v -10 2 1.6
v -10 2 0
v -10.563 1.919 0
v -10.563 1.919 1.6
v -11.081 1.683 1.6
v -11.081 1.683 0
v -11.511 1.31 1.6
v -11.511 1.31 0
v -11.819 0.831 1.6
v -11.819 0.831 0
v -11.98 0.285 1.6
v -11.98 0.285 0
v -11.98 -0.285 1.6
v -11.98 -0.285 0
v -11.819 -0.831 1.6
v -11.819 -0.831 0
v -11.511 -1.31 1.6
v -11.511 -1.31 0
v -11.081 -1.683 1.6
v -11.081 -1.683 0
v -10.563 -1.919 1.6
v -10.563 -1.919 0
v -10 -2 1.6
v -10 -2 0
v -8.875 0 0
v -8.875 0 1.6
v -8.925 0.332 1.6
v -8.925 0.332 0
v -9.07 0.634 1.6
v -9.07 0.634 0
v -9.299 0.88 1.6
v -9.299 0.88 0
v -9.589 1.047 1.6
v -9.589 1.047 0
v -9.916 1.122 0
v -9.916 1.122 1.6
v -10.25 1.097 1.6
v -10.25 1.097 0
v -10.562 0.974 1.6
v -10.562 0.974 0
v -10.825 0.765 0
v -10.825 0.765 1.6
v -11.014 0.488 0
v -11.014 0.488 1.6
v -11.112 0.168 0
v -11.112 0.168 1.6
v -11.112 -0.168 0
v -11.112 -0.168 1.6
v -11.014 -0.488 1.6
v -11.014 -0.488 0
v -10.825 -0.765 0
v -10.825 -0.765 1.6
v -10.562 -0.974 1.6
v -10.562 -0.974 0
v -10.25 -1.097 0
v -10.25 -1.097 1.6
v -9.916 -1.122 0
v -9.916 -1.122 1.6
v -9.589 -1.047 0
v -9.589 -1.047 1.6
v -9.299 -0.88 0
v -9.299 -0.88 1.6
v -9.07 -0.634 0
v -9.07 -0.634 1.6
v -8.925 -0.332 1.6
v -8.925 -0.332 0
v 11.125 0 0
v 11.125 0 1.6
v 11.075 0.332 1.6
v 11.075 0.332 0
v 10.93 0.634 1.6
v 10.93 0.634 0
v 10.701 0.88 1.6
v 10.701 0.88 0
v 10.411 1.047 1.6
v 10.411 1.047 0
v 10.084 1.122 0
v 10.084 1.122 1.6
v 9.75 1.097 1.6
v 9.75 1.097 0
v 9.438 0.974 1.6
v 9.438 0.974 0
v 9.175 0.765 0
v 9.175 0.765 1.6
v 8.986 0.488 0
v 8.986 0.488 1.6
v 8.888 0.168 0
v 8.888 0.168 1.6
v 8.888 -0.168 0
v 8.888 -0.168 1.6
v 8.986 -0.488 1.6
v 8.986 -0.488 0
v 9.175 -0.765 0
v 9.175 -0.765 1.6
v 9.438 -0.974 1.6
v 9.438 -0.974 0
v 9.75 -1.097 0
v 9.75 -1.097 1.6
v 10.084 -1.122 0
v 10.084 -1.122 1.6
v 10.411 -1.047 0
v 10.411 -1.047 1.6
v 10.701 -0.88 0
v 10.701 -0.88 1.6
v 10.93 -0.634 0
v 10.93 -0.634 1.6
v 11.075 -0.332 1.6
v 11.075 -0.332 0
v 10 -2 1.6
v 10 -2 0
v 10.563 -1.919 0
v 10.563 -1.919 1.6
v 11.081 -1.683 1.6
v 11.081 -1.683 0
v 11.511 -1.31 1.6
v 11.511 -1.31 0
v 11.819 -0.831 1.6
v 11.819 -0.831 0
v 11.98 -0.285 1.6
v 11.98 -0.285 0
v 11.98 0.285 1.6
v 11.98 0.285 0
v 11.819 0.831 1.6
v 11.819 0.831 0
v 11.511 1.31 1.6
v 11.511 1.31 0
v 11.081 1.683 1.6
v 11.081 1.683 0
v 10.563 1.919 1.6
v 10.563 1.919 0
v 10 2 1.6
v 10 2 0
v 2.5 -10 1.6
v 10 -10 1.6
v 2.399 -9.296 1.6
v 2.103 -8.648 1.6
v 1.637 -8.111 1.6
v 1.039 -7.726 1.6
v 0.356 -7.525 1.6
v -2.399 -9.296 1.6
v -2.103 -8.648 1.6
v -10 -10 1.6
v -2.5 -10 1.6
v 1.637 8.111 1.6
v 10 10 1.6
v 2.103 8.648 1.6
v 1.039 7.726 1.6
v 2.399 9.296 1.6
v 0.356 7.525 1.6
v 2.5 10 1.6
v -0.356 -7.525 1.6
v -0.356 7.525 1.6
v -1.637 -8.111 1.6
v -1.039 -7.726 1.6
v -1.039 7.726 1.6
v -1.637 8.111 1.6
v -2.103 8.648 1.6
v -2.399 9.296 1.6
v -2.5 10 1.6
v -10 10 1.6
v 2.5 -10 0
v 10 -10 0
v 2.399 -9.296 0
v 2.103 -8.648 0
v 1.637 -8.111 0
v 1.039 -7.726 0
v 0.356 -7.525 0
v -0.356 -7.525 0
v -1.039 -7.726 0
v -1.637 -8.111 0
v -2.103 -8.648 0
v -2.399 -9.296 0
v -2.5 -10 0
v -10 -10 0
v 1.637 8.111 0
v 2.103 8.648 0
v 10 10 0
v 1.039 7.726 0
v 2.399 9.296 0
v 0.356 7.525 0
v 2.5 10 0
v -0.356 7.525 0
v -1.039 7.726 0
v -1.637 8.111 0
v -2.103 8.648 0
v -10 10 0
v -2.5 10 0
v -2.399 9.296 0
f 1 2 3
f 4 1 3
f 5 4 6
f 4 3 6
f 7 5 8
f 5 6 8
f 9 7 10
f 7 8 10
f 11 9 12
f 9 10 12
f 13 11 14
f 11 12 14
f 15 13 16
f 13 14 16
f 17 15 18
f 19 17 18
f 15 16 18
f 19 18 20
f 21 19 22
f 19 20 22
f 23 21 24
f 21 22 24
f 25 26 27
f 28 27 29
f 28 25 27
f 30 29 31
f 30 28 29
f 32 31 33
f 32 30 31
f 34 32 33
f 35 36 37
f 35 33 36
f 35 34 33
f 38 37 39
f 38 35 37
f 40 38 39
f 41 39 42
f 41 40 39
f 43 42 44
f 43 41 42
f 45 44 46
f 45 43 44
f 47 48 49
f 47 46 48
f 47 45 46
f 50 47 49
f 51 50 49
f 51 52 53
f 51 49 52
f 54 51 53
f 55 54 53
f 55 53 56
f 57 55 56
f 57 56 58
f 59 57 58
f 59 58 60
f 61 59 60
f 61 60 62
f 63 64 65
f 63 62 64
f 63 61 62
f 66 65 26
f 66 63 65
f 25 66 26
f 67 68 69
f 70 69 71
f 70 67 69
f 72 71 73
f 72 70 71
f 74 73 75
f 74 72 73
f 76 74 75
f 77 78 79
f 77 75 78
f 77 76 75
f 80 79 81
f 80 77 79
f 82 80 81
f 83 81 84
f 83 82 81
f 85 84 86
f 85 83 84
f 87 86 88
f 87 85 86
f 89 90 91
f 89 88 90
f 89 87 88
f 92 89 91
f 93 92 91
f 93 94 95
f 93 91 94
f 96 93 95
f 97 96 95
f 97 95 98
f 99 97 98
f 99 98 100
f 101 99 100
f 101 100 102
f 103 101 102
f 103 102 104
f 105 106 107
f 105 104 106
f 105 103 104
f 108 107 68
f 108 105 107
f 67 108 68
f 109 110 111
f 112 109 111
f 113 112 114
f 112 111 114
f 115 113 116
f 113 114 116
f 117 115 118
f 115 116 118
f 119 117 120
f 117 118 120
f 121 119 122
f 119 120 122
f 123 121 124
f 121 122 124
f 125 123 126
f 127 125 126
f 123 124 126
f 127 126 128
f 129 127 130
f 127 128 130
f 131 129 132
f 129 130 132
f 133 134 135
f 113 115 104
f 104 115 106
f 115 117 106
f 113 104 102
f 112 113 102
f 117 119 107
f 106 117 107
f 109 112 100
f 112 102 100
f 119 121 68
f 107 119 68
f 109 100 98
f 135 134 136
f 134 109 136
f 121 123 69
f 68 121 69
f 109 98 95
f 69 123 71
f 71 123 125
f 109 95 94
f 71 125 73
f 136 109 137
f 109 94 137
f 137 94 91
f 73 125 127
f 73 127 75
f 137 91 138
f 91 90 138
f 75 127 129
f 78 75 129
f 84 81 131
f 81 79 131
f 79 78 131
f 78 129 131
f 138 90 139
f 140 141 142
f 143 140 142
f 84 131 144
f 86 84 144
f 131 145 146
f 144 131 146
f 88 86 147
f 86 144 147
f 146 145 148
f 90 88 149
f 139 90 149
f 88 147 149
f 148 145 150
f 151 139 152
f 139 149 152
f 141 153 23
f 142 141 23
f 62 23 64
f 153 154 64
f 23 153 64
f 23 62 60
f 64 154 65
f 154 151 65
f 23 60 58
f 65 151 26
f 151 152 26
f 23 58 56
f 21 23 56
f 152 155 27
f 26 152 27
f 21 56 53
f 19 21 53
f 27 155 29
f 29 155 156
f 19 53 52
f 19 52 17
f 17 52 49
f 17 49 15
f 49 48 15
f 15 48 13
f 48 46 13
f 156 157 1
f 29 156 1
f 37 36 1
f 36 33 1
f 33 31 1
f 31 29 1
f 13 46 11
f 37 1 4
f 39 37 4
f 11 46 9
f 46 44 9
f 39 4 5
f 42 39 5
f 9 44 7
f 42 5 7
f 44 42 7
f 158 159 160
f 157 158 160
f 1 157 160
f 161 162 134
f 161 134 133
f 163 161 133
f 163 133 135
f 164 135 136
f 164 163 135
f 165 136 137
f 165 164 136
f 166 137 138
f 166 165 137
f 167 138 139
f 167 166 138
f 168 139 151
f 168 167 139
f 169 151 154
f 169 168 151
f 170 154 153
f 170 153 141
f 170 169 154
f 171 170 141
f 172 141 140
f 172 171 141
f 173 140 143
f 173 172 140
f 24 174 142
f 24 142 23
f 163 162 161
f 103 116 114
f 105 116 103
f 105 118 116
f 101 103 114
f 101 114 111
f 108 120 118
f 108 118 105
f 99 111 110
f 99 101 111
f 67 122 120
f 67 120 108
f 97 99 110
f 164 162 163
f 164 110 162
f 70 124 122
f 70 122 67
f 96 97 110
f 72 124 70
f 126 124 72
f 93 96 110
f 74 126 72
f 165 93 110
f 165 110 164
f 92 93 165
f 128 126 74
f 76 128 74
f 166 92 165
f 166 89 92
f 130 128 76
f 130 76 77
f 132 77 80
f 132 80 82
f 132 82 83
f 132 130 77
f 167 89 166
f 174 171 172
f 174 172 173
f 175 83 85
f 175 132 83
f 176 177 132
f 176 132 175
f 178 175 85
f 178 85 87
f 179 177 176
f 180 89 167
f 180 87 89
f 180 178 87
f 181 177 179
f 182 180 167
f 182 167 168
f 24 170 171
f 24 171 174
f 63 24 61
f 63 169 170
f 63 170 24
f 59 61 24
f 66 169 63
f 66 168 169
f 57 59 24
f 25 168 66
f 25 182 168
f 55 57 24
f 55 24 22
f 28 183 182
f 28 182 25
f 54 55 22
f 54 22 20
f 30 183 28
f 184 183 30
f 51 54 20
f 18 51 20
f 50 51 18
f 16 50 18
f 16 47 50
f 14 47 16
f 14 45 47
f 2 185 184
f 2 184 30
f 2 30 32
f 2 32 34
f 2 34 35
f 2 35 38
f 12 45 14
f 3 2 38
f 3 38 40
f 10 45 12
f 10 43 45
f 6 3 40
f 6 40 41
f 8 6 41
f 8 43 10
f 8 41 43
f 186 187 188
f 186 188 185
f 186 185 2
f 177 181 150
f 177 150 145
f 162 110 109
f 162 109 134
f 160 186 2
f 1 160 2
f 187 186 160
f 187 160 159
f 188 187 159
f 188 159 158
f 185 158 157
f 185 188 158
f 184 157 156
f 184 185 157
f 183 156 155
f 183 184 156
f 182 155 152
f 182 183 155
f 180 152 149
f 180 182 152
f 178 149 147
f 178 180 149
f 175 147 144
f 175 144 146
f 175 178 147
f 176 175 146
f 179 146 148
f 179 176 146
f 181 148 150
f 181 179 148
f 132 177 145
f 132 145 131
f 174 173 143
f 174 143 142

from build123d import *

# Parameters (mm, degrees)
PAD_DEPTH    = 1.6
SKETCH001_R  = 1.125
POCKET_DEPTH = 1.601


with BuildPart() as part:
    # Sketch → Pad (new body)
    with BuildSketch(Plane.XY):
        with BuildLine():
            Line((-10, 10), (-2.5, 10))
            ThreePointArc((-2.5, 10), (0, 7.5), (2.5, 10))
            Line((2.5, 10), (10, 10))
            Line((10, 10), (10, 2))
            ThreePointArc((10, -2), (12, 0), (10, 2))
            Line((10, -2), (10, -10))
            Line((10, -10), (2.5, -10))
            ThreePointArc((2.5, -10), (0, -7.5), (-2.5, -10))
            Line((-2.5, -10), (-10, -10))
            Line((-10, -10), (-10, -2))
            ThreePointArc((-10, 2), (-12, 0), (-10, -2))
            Line((-10, 10), (-10, 2))
        make_face()
    extrude(amount=PAD_DEPTH)

    # Sketch001 → Pocket (cut, through all)
    with BuildSketch(Plane.XY):
        with Locations((-10, 0)):
            Circle(SKETCH001_R)
        with Locations((10, 0)):
            Circle(SKETCH001_R)
    extrude(amount=POCKET_DEPTH, mode=Mode.SUBTRACT)


solid = part.part
